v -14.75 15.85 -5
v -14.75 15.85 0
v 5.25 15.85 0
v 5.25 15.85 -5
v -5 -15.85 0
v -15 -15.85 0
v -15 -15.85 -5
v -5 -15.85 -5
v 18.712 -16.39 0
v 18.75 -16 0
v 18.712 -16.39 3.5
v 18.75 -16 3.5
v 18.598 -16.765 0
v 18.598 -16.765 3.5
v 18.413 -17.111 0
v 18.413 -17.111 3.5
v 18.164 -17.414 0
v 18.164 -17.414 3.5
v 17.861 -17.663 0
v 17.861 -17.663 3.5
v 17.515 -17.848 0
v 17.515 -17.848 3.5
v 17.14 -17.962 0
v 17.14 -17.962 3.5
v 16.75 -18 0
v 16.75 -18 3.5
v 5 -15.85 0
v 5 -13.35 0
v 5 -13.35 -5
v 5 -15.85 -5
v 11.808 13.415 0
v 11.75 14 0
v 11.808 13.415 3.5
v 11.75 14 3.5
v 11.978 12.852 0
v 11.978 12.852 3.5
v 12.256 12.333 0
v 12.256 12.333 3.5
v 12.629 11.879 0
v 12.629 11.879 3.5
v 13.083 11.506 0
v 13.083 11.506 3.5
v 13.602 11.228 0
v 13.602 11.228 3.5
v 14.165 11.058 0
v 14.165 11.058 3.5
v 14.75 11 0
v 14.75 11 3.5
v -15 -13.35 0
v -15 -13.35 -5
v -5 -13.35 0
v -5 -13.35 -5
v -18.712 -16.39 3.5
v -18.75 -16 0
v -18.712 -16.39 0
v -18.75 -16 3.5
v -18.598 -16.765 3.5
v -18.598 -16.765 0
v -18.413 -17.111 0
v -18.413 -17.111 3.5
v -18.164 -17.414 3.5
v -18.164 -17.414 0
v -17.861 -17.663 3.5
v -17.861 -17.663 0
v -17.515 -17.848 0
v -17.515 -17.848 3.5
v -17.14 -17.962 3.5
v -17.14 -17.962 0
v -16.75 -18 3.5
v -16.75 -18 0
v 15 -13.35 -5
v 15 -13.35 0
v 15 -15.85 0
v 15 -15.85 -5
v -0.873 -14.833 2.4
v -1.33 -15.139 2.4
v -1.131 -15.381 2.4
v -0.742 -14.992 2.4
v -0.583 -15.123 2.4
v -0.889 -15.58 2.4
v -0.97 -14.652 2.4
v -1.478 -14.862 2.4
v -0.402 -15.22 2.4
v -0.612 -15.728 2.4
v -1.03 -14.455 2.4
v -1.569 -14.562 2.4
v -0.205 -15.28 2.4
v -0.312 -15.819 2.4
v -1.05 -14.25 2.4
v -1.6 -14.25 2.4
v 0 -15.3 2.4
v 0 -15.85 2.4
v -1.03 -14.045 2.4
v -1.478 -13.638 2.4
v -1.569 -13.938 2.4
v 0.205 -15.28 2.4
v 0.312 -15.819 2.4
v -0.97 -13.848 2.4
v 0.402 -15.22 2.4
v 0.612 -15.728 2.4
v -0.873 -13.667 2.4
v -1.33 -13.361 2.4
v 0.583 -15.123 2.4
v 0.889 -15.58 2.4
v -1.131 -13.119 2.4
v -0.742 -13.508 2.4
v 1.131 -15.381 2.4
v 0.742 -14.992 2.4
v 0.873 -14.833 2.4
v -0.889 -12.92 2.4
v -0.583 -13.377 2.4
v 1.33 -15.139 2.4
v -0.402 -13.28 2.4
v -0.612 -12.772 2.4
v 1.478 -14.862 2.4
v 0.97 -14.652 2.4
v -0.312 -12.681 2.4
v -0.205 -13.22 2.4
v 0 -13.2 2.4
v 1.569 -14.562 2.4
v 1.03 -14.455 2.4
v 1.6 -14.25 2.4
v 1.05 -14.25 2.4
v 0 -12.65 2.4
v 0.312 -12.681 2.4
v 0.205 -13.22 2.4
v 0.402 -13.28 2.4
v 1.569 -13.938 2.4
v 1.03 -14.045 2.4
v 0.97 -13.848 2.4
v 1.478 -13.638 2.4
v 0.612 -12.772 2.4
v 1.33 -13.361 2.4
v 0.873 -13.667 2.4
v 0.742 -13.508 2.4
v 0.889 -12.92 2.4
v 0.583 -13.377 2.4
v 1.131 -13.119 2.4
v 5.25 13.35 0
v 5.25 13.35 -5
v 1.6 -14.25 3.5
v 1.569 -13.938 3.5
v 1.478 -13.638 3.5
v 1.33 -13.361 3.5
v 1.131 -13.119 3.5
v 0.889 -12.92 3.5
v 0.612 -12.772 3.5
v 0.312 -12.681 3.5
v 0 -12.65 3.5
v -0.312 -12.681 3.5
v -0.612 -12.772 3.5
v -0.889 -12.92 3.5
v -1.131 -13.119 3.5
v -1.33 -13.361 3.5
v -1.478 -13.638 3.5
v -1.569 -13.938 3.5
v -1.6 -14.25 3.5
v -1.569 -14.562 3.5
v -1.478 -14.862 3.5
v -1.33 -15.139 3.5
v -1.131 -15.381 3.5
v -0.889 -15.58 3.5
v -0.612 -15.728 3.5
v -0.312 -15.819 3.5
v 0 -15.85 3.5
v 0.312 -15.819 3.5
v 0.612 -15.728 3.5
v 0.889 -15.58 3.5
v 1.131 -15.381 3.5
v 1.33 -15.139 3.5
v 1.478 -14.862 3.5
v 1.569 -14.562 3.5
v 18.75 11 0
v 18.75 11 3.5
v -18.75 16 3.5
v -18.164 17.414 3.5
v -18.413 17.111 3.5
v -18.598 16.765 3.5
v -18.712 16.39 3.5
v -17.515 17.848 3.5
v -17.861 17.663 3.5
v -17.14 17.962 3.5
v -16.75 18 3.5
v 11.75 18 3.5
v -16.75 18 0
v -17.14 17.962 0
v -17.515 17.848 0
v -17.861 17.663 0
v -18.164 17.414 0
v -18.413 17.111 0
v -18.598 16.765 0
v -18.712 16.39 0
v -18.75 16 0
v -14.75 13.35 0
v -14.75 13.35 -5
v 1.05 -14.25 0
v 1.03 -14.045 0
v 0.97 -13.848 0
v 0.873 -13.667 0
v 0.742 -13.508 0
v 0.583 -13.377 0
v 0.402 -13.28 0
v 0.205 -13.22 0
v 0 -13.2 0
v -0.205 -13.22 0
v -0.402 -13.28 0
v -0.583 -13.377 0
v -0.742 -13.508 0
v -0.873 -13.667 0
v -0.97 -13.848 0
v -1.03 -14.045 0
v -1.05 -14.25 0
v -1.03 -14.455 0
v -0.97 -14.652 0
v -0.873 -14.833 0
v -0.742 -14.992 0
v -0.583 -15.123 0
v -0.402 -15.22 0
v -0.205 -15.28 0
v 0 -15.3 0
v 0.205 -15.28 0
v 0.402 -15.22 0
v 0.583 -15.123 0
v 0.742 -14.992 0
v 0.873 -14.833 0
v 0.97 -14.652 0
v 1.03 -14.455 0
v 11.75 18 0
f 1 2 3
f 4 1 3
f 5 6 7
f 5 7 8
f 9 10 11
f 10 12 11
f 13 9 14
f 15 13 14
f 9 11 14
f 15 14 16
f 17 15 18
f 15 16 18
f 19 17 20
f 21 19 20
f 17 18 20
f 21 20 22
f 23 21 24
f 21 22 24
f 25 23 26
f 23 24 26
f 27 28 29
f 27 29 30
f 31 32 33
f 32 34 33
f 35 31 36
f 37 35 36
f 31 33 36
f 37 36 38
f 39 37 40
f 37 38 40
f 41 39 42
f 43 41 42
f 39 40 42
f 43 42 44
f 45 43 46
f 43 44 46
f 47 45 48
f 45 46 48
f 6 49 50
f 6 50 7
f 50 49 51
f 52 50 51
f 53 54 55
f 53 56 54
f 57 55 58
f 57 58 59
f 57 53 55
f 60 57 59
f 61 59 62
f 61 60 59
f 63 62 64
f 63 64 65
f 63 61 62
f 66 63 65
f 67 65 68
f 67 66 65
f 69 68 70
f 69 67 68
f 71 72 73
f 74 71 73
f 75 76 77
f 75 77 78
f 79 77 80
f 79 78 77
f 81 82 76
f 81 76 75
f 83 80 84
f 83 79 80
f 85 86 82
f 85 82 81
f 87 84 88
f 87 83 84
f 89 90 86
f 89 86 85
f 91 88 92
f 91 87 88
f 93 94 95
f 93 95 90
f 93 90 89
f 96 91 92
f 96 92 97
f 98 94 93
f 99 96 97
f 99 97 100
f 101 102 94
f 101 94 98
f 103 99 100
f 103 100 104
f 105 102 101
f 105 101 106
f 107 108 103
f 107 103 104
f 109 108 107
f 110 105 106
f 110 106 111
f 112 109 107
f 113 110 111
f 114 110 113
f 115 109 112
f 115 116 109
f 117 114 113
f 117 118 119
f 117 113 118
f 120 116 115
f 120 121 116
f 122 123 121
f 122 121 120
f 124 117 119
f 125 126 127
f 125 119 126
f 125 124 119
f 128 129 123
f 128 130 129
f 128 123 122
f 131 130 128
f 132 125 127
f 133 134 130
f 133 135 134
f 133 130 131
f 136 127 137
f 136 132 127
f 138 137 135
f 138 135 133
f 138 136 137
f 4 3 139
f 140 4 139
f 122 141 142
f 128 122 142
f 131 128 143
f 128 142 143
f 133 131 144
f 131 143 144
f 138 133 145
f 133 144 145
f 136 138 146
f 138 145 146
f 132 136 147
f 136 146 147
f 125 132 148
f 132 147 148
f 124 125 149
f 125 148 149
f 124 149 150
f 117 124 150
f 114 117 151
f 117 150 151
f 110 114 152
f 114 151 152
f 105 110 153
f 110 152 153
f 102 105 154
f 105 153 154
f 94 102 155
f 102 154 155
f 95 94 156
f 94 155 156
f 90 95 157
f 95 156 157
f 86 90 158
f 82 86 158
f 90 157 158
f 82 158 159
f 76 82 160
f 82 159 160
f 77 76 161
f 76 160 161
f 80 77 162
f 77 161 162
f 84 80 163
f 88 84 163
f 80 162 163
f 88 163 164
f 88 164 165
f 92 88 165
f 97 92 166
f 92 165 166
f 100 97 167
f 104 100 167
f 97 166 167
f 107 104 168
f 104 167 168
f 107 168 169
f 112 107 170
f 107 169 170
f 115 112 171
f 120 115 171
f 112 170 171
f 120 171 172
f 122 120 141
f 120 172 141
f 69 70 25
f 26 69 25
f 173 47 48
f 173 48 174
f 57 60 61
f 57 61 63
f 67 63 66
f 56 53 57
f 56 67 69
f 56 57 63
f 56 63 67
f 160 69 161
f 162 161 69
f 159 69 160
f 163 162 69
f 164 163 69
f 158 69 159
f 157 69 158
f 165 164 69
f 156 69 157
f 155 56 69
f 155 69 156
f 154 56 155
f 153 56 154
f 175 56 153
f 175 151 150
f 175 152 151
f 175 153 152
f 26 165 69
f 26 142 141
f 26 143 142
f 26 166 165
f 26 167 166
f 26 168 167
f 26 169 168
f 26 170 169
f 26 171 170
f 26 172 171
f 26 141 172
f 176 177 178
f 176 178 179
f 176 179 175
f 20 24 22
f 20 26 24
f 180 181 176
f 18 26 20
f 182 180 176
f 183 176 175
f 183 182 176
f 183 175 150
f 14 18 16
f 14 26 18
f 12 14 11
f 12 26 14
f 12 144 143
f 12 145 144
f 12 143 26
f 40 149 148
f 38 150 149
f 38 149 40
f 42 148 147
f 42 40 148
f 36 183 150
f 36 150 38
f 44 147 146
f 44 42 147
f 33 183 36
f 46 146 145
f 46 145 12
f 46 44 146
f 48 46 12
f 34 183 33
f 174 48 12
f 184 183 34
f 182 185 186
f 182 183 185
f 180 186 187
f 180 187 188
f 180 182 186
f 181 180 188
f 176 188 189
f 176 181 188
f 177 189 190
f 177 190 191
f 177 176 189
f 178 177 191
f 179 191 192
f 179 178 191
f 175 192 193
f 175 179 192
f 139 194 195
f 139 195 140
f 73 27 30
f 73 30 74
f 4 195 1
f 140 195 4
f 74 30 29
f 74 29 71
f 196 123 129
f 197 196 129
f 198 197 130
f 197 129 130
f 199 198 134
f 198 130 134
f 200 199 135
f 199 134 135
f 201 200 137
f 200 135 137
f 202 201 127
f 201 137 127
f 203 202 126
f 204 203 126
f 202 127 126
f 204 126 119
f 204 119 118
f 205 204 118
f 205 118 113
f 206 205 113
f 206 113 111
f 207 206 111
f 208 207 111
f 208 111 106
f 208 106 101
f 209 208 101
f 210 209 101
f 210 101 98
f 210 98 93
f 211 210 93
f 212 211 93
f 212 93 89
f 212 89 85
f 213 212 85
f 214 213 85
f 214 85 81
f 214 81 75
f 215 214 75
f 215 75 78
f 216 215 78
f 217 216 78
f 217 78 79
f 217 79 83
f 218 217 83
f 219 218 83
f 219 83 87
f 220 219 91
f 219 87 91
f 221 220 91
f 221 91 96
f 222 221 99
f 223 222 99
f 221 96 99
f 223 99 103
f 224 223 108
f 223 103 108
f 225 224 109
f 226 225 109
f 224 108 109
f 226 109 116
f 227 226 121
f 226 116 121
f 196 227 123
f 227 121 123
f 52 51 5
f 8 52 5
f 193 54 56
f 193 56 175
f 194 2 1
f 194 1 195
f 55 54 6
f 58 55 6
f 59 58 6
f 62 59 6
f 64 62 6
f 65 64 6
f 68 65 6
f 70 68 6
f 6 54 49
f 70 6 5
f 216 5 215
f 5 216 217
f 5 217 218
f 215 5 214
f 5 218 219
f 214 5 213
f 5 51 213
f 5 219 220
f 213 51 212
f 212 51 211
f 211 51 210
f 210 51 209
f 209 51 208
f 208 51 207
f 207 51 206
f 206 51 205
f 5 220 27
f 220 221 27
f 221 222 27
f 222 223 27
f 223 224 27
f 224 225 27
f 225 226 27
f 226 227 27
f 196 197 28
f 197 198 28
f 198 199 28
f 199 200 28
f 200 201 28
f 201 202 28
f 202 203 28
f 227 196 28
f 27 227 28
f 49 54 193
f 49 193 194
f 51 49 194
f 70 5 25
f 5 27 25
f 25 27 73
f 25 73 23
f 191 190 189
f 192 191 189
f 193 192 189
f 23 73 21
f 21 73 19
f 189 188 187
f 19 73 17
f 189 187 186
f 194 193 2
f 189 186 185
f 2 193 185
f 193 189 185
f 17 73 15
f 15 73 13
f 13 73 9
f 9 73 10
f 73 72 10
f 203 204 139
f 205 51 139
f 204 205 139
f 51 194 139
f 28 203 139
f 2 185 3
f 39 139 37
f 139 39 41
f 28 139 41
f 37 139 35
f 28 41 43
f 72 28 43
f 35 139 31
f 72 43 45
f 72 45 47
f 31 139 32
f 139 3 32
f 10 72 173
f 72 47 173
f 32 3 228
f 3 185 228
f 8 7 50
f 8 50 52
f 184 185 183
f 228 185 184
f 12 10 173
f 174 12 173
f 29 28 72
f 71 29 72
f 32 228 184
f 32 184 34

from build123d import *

# Parameters (mm, degrees)
SKETCH_W        = 37.5
SKETCH_H        = 36
PAD_DEPTH       = 3.5
SKETCH001_R     = 1.05
POCKET_DEPTH    = 5
SKETCH002_R     = 1.6
POCKET001_DEPTH = 1.1
SKETCH003_W     = 10
SKETCH003_H     = 2.5
PAD001_DEPTH    = 5
SKETCH004_W     = 20
SKETCH004_H     = 2.5
PAD002_DEPTH    = 5
SKETCH005_W     = 7
SKETCH005_H     = 7
POCKET002_DEPTH = 5
FILLET_R        = 3
FILLET001_R     = 2


with BuildPart() as part:
    # Sketch → Pad (new body)
    with BuildSketch(Plane.XY):
        Rectangle(SKETCH_W, SKETCH_H)
    extrude(amount=PAD_DEPTH)

    # Sketch001 (on Face6 of Pad) → Pocket (cut)
    with BuildSketch(Plane.XY.offset(3.5)):
        with Locations((0, -14.25)):
            Circle(SKETCH001_R)
    extrude(amount=-POCKET_DEPTH, mode=Mode.SUBTRACT)

    # Sketch002 (on Face5 of Pocket) → Pocket001 (cut)
    with BuildSketch(Plane.XY.offset(3.5)):
        with Locations((0, -14.25)):
            Circle(SKETCH002_R)
    extrude(amount=-POCKET001_DEPTH, mode=Mode.SUBTRACT)

    # Sketch003 (on Face4 of Pocket001) → Pad001 (join)
    with BuildSketch(Plane(origin=(0, 0, 0), x_dir=(1, 0, 0), z_dir=(0, 0, -1))):
        with Locations((-10, 14.6)):
            Rectangle(SKETCH003_W, SKETCH003_H)
        with Locations((10, 14.6)):
            Rectangle(SKETCH003_W, SKETCH003_H)
    extrude(amount=PAD001_DEPTH)

    # Sketch004 (on Face4 of Pad001) → Pad002 (join)
    with BuildSketch(Plane(origin=(0, 0, 0), x_dir=(1, 0, 0), z_dir=(0, 0, -1))):
        with Locations((-4.75, -14.6)):
            Rectangle(SKETCH004_W, SKETCH004_H)
    extrude(amount=PAD002_DEPTH)

    # Sketch005 (on Face4 of Pad002) → Pocket002 (cut)
    with BuildSketch(Plane(origin=(0, 0, 0), x_dir=(1, 0, 0), z_dir=(0, 0, -1))):
        with Locations((15.25, -14.5)):
            Rectangle(SKETCH005_W, SKETCH005_H)
    extrude(amount=-POCKET002_DEPTH, mode=Mode.SUBTRACT)

    # Fillet
    fillet_edges = [part.edges().sort_by_distance(p)[0] for p in [
        (11.75, 11, 1.75),
    ]]
    fillet(fillet_edges, radius=FILLET_R)

    # Fillet001
    fillet001_edges = [part.edges().sort_by_distance(p)[0] for p in [
        (18.75, -18, 1.75),
        (-18.75, 18, 1.75),
        (-18.75, -18, 1.75),
    ]]
    fillet(fillet001_edges, radius=FILLET001_R)


solid = part.part
